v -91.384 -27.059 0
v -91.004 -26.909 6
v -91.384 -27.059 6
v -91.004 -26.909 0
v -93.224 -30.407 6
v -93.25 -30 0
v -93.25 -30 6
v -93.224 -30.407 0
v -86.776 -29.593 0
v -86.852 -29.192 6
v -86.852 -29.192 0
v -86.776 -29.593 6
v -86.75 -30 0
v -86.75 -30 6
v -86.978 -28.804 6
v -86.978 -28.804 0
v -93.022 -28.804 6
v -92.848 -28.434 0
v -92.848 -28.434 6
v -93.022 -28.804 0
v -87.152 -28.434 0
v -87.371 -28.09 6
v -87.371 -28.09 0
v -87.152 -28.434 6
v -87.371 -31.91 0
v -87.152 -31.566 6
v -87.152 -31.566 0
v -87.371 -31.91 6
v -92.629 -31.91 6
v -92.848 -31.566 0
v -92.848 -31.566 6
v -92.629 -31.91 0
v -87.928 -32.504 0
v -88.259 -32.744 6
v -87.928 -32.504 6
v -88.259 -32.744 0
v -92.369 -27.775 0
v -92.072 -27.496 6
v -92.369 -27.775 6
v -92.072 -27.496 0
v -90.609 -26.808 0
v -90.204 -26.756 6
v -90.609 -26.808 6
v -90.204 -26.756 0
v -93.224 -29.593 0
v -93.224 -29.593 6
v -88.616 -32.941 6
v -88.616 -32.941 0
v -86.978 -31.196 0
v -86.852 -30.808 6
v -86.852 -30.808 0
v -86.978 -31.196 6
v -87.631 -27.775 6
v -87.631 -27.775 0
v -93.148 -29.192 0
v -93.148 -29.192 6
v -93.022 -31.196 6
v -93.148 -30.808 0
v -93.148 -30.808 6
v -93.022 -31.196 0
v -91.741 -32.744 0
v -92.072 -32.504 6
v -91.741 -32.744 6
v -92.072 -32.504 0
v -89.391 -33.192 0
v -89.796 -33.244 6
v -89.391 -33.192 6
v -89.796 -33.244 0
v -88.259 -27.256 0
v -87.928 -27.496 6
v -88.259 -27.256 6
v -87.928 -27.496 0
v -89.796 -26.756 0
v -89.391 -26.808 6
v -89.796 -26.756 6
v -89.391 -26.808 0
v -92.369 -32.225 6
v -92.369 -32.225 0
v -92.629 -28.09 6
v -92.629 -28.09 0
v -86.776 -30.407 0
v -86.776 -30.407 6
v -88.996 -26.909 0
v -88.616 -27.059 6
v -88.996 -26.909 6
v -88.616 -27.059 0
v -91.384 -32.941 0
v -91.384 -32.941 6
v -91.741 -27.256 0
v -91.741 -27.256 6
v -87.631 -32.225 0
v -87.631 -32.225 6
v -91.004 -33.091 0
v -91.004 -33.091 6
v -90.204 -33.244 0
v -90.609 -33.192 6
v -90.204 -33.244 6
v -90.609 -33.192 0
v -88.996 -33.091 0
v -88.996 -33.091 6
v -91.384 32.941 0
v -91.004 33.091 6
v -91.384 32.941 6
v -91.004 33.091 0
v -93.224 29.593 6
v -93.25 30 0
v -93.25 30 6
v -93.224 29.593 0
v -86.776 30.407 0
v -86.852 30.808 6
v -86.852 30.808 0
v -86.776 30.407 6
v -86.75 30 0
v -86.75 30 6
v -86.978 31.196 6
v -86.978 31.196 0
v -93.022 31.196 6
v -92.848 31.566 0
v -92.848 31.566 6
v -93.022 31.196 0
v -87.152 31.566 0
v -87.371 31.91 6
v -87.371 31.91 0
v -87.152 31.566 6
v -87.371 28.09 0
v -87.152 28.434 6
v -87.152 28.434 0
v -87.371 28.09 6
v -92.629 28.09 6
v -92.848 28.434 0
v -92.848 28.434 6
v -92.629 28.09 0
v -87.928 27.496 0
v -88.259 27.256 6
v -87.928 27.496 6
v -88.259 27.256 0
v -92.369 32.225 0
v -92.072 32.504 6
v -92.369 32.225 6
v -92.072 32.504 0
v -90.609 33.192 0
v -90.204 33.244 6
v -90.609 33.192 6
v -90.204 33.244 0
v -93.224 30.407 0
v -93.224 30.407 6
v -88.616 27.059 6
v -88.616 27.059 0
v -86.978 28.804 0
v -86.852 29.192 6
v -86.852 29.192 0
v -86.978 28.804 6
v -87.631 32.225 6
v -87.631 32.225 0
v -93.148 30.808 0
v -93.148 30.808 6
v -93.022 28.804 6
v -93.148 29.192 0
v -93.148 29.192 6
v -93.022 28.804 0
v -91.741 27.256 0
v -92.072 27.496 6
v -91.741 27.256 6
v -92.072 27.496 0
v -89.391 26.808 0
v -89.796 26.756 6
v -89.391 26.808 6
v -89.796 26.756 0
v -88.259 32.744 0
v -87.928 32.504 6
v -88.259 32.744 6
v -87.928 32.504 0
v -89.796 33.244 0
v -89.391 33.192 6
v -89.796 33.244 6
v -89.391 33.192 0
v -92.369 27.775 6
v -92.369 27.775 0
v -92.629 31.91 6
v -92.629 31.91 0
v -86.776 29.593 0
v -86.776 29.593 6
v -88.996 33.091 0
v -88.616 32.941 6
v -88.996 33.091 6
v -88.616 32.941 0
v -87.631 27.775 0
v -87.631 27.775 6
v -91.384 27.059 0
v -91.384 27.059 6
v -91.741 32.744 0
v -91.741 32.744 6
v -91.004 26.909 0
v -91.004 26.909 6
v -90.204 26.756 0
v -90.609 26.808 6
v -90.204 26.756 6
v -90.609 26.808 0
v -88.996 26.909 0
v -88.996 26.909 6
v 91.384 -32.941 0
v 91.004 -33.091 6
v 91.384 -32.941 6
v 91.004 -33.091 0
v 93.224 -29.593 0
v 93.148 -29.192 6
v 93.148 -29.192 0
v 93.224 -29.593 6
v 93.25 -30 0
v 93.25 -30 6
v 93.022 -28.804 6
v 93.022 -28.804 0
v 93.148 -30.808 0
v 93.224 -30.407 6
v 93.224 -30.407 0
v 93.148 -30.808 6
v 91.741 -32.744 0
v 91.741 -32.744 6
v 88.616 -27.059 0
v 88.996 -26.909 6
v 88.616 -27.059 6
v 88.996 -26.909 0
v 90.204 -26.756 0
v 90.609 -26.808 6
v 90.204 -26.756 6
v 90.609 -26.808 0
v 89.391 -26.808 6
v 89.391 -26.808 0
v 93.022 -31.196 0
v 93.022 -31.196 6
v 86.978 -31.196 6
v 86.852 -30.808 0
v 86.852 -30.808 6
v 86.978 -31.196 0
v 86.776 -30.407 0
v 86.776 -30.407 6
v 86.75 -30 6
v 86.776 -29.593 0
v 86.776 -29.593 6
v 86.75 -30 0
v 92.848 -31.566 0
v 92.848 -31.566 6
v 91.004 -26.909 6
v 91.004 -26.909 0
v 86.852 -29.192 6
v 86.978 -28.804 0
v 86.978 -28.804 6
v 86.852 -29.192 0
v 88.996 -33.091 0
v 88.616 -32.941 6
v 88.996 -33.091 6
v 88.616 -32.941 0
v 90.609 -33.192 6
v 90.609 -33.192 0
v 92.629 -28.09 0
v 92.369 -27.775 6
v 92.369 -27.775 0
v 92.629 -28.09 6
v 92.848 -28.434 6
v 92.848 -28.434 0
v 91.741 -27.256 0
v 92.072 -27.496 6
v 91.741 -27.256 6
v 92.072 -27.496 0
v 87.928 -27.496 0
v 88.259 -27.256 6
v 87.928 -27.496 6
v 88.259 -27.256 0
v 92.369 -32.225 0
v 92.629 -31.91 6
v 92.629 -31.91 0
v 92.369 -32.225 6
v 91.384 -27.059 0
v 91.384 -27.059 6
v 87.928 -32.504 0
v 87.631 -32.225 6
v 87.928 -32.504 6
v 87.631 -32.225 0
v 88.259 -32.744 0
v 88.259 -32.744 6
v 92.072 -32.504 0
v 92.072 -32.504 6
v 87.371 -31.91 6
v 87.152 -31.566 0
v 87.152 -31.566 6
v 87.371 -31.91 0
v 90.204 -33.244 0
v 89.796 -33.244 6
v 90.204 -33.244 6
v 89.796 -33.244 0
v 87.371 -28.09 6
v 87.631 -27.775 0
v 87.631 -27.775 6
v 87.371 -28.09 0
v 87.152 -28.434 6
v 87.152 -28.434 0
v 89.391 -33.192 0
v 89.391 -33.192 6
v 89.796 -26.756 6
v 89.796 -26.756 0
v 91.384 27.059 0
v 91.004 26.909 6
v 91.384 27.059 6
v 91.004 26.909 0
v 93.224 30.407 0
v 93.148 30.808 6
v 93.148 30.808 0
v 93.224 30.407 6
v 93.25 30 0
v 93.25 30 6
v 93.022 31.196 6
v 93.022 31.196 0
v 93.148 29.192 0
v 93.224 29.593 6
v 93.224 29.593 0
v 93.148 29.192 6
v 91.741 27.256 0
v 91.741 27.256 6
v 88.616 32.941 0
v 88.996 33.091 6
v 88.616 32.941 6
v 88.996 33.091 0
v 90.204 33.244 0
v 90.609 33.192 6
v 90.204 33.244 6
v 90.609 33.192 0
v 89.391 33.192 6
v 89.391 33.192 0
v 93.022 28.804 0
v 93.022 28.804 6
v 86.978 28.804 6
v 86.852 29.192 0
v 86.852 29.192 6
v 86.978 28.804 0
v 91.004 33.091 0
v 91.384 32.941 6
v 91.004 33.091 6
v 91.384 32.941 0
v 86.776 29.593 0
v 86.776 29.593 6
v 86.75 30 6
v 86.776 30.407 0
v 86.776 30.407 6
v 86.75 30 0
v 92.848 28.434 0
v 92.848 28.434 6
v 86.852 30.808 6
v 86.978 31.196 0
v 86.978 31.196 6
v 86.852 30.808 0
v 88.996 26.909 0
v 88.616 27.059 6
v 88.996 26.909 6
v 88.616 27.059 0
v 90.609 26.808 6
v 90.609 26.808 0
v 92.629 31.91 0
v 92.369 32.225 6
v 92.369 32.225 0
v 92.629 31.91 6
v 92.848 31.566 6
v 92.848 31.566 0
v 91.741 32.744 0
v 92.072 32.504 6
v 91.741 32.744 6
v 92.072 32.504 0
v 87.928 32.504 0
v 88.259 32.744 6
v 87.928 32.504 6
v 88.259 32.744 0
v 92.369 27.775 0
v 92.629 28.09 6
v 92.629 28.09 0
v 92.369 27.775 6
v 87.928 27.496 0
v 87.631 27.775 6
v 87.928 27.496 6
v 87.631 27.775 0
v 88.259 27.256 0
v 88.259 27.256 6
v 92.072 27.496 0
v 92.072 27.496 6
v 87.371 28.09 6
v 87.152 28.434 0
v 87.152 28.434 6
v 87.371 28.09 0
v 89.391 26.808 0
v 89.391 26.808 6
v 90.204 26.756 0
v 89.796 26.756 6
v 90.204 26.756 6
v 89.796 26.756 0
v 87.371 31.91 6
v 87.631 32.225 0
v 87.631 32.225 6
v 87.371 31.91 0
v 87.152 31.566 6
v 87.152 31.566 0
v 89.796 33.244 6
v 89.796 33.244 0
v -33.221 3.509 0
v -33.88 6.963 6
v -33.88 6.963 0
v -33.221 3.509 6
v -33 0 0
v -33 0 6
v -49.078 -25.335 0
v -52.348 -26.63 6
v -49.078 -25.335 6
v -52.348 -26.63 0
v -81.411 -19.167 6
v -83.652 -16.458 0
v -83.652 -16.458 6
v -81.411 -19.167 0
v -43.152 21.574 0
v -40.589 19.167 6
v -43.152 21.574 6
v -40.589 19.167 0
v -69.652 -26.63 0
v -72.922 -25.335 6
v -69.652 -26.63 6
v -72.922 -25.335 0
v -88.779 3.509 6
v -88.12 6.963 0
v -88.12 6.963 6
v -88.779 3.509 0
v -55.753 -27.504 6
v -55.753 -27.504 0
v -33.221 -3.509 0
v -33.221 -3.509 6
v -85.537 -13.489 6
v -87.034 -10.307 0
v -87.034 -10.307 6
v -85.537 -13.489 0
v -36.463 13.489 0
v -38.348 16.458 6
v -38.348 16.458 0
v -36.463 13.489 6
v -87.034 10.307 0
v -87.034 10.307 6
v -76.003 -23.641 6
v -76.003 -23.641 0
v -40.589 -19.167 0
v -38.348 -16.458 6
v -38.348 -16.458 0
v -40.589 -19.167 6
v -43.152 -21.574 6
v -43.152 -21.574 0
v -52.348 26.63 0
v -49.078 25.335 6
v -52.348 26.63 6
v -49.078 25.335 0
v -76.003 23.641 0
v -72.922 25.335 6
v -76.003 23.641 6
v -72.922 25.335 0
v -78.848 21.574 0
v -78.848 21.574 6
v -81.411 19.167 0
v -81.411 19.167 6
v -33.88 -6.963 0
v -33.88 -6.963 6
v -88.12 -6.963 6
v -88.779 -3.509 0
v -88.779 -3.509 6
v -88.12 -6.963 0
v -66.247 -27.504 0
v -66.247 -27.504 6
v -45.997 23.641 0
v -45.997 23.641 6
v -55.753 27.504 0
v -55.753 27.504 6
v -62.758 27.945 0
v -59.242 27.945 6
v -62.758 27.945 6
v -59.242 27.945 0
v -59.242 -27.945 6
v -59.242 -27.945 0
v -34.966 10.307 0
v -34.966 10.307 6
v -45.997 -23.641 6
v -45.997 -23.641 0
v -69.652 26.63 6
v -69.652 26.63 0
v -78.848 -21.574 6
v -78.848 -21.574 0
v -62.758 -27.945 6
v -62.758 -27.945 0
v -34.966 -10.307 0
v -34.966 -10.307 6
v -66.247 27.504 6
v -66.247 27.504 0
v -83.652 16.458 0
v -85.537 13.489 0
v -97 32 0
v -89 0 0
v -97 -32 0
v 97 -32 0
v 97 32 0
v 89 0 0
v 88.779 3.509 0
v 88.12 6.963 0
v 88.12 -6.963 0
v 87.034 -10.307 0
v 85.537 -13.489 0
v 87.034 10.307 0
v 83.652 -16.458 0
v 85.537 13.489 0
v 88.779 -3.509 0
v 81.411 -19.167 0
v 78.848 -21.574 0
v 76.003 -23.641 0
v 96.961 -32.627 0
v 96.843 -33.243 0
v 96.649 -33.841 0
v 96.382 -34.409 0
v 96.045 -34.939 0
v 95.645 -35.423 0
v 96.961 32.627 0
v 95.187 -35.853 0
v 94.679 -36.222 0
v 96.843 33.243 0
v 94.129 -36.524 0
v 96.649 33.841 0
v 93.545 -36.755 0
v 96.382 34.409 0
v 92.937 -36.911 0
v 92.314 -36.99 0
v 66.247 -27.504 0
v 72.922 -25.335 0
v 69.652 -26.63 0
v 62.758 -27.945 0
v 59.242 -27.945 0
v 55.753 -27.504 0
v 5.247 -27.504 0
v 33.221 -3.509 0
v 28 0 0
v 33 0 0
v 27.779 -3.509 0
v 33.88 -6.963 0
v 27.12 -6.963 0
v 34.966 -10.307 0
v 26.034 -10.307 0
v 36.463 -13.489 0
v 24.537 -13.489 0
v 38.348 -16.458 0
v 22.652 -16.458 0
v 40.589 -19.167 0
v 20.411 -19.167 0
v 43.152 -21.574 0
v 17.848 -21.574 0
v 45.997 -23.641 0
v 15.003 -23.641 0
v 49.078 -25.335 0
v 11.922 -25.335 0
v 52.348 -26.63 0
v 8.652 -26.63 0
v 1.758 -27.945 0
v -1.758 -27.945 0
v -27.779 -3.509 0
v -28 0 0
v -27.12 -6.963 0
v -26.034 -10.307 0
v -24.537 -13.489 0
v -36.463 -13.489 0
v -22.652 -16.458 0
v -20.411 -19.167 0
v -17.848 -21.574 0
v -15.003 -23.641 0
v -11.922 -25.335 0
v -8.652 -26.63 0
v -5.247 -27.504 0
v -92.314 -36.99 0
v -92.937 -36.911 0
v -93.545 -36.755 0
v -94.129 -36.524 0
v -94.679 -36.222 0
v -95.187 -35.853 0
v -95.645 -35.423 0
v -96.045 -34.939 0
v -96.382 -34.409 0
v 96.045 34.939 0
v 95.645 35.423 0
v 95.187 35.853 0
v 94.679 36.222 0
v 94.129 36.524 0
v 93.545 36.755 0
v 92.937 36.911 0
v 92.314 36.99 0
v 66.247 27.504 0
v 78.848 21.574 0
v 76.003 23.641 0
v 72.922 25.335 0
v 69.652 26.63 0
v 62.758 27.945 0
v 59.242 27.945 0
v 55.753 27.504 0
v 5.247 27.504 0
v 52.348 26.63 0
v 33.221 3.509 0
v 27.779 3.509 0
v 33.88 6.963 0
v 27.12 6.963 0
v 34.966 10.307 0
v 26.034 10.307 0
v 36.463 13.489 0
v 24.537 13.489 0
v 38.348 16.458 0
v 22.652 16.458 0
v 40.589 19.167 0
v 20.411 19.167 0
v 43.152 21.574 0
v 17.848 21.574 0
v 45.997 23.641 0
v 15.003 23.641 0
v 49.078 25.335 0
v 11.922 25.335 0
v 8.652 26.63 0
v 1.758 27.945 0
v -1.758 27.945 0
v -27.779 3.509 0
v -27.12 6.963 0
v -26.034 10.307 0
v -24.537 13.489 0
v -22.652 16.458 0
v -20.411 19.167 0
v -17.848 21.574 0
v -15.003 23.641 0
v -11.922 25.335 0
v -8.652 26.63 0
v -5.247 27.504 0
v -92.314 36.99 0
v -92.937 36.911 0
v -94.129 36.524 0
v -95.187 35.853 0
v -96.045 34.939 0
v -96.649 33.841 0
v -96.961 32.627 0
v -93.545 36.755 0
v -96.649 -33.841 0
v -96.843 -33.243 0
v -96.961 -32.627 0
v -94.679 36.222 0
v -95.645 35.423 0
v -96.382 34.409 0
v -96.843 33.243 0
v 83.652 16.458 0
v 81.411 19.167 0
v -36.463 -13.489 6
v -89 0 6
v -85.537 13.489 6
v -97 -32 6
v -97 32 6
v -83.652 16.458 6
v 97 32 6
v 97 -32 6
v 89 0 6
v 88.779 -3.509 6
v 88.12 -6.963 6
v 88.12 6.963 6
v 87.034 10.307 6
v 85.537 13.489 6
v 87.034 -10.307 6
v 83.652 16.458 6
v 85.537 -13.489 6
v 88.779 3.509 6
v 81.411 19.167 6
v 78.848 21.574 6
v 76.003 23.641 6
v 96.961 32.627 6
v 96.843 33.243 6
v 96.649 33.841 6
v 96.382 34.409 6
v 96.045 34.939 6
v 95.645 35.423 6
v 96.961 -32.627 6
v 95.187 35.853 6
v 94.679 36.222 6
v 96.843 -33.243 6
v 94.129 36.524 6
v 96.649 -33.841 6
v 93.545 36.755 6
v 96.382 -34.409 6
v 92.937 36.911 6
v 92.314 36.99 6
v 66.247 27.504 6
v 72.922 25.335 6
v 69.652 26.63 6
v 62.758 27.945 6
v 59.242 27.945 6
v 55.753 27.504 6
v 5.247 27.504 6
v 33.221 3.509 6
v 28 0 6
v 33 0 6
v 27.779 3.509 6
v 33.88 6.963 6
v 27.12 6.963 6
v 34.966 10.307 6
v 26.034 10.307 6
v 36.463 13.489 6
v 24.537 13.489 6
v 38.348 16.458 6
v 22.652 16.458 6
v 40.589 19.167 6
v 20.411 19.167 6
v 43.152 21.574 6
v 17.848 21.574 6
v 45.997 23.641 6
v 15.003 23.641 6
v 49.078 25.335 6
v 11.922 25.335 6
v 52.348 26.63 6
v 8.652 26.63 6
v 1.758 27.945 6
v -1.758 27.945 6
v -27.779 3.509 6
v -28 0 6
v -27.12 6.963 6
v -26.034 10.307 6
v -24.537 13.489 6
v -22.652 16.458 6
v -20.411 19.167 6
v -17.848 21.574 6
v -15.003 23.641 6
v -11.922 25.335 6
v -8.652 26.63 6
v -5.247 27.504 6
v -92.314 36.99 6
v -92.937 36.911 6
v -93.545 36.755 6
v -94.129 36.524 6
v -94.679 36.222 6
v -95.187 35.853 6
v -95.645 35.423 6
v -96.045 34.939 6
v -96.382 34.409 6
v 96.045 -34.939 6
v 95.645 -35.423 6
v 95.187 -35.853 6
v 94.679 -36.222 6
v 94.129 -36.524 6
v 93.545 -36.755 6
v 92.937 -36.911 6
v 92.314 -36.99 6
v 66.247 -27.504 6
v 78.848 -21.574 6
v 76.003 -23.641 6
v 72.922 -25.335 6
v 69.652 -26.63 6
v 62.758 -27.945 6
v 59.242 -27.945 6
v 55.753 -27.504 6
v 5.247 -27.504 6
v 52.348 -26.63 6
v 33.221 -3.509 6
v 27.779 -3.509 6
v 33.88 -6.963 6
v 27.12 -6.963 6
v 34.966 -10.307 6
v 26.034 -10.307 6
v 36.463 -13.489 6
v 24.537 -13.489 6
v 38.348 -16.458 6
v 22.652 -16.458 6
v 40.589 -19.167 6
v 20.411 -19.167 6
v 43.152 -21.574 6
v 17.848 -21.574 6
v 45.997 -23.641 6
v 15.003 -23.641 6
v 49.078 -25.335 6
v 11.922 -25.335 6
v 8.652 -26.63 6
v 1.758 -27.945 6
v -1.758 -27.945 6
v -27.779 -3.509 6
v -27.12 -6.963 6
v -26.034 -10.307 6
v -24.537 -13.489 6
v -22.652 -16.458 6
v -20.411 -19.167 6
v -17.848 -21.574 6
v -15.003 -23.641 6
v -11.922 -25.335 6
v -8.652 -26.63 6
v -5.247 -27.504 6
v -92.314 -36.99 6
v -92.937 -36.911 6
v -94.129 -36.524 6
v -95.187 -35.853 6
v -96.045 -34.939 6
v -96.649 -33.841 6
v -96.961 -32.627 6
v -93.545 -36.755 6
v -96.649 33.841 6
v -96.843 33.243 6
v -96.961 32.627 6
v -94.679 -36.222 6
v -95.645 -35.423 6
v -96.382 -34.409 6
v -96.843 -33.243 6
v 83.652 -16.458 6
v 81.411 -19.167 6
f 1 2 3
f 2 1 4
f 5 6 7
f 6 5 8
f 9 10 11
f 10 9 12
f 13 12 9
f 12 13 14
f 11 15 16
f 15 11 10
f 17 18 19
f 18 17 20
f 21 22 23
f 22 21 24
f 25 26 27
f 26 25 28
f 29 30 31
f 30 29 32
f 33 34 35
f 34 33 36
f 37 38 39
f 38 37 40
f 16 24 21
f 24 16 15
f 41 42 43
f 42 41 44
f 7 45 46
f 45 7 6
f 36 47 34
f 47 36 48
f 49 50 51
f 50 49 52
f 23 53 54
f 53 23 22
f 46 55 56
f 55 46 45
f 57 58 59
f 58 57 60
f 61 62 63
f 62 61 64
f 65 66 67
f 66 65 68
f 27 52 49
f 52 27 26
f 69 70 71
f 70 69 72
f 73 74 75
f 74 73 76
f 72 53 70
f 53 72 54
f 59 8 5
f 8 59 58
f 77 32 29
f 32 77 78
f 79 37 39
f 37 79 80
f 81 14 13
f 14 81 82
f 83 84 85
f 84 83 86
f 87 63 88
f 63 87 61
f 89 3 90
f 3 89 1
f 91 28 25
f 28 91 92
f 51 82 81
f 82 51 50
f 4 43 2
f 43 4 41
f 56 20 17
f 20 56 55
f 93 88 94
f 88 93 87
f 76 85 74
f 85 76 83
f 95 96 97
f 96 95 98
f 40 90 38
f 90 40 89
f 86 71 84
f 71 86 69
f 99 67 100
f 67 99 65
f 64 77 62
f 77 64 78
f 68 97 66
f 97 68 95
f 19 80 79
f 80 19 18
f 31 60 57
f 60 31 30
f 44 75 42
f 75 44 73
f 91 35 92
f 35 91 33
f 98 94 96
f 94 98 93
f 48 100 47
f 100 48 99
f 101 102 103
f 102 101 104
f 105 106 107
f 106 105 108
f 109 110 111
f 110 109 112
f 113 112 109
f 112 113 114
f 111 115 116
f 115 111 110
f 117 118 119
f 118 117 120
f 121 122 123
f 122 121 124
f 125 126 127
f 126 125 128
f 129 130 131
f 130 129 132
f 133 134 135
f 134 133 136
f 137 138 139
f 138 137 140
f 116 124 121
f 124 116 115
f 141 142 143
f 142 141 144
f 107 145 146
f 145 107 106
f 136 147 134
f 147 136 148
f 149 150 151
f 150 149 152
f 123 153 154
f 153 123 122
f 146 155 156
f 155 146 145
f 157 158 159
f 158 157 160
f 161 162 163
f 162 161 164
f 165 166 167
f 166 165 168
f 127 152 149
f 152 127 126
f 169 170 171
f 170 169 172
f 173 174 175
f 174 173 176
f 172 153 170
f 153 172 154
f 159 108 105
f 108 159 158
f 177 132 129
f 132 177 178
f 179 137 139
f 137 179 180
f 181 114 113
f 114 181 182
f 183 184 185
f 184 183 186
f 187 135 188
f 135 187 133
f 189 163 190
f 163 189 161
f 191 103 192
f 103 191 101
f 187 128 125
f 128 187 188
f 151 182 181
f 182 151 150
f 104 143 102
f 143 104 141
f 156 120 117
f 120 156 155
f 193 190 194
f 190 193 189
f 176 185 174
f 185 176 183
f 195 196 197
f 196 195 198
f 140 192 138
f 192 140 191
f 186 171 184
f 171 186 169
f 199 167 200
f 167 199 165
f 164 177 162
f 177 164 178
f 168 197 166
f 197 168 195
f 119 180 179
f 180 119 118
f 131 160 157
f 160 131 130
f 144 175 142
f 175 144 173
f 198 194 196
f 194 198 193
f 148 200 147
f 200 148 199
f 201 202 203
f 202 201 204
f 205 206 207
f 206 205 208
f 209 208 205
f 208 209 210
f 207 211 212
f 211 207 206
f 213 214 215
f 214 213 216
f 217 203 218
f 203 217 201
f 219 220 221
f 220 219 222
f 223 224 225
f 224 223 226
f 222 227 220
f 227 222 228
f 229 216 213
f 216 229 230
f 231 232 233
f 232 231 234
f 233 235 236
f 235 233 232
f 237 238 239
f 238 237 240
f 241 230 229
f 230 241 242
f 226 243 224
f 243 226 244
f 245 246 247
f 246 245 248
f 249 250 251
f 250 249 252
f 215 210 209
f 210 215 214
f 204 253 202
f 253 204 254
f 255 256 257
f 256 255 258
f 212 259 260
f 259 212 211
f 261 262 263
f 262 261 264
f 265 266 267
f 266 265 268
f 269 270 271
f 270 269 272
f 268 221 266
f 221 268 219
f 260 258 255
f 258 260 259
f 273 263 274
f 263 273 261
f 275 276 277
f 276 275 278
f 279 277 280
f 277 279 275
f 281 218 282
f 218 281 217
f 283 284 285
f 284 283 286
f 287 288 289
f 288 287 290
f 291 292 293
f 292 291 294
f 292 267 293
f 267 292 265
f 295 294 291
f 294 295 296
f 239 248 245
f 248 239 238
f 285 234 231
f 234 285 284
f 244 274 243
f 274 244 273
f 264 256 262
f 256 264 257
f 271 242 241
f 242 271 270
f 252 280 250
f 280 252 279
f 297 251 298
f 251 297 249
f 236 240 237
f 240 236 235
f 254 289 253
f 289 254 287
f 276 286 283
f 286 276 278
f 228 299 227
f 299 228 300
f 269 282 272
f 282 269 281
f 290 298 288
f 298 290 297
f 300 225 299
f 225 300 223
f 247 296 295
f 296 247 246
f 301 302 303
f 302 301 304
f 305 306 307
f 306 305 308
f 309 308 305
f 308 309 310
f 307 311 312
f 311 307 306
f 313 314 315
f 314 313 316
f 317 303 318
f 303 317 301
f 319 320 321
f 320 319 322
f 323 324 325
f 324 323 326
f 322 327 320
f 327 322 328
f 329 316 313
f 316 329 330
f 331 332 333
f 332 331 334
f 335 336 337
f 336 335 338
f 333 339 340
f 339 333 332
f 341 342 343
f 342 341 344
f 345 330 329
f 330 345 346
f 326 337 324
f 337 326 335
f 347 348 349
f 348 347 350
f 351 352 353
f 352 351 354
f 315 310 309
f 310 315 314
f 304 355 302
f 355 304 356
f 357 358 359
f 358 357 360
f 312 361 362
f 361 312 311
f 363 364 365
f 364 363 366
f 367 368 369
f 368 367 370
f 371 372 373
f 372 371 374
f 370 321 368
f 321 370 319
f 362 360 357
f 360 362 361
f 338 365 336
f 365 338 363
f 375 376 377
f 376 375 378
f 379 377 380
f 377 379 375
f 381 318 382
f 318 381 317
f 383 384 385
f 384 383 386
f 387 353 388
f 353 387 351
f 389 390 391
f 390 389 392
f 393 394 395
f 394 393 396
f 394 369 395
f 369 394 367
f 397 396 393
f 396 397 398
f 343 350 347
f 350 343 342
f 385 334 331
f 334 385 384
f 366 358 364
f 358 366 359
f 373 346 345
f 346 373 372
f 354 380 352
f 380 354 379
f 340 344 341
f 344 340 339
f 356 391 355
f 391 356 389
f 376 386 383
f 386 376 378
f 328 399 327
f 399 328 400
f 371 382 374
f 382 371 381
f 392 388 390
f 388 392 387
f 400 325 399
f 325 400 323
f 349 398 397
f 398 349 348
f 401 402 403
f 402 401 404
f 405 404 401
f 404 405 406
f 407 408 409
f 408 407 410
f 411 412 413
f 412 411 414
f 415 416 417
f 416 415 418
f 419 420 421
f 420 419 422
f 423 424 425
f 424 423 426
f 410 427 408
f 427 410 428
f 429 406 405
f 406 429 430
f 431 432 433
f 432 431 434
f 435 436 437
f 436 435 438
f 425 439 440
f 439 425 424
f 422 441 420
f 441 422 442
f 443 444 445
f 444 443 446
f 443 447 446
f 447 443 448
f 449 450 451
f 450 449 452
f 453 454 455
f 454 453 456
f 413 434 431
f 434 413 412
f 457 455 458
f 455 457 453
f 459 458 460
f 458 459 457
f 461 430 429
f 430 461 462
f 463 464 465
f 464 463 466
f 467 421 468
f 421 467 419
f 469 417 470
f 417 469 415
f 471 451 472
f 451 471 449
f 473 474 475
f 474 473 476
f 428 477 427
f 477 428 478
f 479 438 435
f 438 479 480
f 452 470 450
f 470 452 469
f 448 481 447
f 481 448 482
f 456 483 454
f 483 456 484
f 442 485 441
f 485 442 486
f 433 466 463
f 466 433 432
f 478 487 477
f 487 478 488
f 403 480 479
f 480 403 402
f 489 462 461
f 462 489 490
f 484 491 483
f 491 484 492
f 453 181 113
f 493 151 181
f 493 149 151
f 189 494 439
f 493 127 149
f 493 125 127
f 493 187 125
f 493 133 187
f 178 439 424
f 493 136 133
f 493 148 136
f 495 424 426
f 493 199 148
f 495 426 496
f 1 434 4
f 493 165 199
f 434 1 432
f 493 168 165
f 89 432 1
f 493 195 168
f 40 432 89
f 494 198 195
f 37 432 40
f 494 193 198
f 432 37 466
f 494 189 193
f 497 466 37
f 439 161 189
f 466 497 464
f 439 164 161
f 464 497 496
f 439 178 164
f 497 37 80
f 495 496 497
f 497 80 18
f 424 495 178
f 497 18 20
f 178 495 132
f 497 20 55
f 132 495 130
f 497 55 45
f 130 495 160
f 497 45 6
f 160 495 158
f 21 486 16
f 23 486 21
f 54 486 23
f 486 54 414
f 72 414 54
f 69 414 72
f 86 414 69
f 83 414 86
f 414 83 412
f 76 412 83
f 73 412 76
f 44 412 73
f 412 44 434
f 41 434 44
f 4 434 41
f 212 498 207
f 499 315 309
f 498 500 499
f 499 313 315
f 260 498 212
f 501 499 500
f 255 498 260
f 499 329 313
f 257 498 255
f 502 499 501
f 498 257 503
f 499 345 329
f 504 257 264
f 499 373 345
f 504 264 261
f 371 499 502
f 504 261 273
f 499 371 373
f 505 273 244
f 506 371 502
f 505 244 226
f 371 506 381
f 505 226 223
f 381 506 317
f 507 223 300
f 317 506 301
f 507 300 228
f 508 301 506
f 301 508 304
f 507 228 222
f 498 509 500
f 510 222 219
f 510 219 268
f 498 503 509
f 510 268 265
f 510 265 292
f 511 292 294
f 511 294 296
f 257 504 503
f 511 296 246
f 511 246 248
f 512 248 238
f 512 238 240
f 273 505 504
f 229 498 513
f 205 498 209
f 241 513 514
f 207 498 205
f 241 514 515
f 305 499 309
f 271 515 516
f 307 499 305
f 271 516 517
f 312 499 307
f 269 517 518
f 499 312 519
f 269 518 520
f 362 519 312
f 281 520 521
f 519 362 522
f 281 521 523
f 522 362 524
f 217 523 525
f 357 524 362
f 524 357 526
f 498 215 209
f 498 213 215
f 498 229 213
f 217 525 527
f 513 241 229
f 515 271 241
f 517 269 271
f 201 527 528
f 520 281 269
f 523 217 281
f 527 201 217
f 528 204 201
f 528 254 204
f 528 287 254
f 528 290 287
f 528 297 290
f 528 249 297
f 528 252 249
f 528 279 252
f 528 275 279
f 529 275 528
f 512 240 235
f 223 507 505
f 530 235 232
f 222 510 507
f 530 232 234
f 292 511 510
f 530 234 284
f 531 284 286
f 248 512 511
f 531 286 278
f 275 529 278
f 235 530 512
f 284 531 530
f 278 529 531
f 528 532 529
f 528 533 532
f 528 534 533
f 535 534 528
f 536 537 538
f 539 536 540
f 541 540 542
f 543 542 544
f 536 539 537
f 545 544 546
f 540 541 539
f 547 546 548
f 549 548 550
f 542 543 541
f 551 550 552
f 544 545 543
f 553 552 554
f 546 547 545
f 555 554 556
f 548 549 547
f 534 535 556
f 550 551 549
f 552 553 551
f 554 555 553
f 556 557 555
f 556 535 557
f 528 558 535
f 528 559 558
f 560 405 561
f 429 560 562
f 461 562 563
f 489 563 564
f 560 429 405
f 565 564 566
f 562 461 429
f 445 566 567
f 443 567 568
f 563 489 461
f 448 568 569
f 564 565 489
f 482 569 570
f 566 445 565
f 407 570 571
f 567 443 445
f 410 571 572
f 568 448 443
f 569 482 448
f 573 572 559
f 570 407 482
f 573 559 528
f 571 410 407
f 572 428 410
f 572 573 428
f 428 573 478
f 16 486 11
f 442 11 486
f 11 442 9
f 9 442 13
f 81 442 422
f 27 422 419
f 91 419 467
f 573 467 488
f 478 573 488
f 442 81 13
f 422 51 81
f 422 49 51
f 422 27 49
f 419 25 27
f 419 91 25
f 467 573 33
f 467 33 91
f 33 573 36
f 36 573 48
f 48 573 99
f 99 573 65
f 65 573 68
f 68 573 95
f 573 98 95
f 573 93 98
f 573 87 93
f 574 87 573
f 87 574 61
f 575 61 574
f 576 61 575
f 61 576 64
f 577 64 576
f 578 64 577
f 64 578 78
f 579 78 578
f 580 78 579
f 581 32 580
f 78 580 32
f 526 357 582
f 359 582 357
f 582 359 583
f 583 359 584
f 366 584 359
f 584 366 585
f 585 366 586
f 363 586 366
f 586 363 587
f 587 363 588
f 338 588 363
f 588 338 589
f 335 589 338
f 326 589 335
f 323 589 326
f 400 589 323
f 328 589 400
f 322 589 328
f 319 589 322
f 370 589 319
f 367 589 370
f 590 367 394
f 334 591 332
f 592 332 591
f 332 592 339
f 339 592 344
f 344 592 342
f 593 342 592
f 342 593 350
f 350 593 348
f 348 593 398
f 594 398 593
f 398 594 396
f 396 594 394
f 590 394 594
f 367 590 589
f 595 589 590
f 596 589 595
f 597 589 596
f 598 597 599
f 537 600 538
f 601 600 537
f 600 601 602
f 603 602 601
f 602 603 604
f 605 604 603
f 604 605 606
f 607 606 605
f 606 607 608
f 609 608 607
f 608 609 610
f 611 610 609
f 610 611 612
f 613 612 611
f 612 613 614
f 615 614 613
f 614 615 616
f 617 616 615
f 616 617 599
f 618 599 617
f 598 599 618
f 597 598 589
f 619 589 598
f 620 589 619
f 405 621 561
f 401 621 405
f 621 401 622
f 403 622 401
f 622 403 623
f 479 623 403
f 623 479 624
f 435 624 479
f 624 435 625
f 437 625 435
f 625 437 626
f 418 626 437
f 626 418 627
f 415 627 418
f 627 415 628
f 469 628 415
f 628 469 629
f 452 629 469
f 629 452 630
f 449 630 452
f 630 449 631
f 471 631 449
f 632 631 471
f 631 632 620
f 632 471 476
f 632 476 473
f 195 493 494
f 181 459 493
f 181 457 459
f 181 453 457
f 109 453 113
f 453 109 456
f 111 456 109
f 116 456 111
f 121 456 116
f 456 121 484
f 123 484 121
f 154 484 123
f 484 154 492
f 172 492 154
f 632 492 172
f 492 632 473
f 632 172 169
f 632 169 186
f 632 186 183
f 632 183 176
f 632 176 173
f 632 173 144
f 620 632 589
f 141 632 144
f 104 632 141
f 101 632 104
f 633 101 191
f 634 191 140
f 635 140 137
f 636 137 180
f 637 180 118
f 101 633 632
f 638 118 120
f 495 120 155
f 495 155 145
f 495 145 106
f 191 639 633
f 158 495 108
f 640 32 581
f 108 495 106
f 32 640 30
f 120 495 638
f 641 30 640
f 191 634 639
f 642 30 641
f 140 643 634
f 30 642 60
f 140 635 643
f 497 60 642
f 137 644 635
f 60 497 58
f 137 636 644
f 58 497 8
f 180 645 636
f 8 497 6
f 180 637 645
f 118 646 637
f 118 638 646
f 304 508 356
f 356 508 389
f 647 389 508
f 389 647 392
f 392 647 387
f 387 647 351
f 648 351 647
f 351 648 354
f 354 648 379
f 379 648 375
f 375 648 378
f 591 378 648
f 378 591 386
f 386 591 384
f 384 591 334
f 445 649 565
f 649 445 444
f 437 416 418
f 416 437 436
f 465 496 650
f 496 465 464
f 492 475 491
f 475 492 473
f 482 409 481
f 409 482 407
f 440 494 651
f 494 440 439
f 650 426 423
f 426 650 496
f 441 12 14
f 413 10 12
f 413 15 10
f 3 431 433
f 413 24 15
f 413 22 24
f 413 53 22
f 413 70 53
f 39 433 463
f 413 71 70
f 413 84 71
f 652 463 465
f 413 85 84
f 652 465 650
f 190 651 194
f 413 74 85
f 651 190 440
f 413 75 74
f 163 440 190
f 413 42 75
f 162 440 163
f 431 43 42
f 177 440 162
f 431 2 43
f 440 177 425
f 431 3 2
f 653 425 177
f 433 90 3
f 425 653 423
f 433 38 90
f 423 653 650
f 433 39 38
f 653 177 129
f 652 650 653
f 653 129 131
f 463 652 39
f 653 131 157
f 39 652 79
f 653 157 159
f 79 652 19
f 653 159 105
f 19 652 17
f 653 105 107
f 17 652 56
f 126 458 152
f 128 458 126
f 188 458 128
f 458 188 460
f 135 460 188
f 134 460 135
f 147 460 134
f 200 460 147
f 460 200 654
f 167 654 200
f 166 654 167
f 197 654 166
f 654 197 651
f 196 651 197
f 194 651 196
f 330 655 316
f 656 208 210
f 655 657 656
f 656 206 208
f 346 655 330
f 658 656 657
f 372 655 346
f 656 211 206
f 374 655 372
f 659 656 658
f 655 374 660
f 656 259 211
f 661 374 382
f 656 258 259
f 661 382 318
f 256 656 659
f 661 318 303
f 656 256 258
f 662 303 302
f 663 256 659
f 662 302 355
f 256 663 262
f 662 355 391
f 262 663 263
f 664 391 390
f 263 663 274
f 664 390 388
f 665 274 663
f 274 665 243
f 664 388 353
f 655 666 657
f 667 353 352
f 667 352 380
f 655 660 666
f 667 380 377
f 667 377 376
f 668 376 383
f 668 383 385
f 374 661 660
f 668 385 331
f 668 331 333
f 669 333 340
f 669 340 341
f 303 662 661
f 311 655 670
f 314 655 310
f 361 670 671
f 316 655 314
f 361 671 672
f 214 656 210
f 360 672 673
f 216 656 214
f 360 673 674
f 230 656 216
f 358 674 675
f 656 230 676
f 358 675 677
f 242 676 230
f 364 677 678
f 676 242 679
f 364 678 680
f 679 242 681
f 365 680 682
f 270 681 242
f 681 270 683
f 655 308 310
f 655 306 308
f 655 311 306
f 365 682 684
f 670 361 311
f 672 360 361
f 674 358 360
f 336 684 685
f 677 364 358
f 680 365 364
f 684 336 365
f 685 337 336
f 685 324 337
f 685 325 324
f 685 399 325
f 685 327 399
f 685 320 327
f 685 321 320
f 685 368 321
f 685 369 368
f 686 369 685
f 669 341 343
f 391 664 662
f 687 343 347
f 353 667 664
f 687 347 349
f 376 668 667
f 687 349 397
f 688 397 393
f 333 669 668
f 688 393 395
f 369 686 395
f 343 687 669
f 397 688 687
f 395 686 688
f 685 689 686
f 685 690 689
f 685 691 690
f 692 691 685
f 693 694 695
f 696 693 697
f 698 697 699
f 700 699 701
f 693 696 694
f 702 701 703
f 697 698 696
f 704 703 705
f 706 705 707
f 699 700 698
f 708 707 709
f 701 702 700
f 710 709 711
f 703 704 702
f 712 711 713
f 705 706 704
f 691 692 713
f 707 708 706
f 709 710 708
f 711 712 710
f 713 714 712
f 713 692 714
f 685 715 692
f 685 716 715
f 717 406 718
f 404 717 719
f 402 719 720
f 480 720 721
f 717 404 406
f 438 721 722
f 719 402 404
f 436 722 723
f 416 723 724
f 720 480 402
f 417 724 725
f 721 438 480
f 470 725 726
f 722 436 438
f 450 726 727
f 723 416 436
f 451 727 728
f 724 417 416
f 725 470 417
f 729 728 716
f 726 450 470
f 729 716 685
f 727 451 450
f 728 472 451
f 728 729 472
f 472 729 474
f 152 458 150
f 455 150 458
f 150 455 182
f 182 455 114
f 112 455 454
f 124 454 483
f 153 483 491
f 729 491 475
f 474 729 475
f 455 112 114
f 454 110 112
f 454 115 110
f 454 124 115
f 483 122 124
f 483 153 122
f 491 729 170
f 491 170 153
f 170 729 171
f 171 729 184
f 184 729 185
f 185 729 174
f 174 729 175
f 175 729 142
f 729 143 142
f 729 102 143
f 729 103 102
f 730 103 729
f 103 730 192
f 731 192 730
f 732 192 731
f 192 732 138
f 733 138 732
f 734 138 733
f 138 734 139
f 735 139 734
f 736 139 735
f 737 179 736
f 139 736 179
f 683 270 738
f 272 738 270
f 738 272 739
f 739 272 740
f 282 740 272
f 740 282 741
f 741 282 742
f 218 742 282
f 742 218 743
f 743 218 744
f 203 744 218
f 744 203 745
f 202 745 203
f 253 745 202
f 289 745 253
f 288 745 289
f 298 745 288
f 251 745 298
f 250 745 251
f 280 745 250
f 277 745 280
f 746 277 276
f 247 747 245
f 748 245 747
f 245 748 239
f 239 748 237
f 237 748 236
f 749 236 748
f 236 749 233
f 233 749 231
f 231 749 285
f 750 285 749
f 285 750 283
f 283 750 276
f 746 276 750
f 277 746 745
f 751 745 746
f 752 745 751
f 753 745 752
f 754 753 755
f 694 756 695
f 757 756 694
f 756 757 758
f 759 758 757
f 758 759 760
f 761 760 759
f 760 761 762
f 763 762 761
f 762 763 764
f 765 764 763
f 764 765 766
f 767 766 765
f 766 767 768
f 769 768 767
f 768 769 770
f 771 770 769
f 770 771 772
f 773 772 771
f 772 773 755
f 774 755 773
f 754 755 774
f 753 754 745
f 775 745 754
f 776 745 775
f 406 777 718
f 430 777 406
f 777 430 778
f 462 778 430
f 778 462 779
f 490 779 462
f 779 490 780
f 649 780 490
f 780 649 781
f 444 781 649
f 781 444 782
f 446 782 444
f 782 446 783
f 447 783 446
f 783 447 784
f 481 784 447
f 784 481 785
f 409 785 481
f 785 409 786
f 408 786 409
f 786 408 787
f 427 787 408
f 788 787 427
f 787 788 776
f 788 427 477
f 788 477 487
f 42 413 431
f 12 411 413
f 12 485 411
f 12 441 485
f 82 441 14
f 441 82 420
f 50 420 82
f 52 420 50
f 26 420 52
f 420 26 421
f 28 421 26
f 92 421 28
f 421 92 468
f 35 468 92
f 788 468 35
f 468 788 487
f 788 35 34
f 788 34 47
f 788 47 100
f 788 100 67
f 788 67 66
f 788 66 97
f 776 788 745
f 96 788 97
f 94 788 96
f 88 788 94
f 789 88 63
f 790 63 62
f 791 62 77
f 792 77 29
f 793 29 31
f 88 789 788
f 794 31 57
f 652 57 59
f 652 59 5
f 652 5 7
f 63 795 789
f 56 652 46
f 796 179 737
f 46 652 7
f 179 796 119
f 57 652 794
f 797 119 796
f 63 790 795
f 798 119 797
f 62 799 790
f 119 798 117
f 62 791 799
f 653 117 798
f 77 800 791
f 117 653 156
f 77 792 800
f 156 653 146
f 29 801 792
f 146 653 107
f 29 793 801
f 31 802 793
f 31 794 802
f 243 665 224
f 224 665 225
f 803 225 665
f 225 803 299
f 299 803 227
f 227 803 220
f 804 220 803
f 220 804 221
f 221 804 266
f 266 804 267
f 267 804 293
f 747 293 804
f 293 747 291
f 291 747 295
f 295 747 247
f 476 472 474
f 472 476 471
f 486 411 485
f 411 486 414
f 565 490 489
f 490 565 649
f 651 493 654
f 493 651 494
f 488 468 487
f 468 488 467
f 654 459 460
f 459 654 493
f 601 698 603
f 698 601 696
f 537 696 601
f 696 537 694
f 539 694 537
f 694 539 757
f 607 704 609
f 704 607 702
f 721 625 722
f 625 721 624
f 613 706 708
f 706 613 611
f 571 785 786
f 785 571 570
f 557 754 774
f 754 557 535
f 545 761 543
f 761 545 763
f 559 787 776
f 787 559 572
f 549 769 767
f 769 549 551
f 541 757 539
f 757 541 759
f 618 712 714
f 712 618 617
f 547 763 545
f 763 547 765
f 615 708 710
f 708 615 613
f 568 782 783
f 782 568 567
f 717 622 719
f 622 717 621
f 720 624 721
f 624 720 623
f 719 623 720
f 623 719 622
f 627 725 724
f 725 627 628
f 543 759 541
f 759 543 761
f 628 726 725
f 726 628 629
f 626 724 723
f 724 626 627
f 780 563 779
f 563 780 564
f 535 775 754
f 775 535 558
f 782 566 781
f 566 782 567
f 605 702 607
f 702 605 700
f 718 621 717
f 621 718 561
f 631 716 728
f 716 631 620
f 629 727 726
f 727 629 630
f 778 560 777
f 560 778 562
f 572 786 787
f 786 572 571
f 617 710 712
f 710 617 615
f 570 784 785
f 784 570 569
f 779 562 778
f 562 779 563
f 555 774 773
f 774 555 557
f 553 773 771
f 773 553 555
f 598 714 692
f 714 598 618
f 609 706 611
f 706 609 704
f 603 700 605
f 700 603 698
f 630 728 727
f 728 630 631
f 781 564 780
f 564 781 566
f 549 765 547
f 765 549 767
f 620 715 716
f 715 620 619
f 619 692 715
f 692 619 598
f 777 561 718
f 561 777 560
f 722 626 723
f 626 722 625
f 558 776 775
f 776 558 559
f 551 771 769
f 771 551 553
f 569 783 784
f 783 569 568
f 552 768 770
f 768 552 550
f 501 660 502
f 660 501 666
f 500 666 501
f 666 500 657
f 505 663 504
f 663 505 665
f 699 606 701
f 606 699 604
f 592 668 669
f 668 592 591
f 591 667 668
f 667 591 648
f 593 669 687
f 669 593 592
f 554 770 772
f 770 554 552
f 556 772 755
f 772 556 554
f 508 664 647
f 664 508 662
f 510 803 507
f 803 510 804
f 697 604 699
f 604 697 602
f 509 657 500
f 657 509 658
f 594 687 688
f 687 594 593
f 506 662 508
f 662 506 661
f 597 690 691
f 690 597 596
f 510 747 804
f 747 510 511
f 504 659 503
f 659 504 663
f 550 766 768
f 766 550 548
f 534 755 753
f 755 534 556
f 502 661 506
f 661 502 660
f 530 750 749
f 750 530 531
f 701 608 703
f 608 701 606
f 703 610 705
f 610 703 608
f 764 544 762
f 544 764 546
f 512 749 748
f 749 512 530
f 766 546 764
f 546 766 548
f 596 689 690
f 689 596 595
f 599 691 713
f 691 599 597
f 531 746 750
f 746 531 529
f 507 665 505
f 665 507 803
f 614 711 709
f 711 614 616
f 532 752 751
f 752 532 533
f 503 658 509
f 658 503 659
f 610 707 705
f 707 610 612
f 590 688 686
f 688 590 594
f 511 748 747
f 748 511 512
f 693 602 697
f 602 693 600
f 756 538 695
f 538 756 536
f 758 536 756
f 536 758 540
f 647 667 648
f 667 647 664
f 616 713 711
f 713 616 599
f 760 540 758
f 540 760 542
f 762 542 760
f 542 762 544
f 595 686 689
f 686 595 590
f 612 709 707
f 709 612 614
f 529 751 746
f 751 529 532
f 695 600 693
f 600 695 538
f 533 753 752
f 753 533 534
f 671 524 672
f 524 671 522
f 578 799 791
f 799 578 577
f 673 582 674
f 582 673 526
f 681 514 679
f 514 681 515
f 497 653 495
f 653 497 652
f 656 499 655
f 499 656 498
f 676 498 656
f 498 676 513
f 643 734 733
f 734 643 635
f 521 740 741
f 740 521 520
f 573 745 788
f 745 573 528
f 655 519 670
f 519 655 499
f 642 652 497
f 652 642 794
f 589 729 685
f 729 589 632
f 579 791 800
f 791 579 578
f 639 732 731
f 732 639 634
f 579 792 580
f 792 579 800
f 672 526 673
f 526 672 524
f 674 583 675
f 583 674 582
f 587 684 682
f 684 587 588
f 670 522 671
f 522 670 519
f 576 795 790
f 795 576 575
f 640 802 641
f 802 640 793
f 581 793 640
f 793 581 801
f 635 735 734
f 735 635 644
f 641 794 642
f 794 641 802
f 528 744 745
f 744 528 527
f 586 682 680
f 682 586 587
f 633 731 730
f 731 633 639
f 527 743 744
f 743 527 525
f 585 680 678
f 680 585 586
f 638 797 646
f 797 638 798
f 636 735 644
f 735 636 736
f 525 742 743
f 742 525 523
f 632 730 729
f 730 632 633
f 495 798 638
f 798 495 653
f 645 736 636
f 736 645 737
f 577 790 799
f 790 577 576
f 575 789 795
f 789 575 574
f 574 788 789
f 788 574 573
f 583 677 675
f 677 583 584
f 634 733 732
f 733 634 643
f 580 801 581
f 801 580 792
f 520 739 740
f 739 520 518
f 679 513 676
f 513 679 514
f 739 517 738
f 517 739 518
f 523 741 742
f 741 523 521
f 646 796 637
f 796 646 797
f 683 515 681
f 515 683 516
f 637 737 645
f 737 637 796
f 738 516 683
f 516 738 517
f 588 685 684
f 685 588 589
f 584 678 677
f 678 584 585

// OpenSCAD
$fn = 50;


difference() {
	union() {
		hull() {
			translate(v = [-92.0000000000, 32.0000000000, 0]) {
				cylinder(h = 6, r = 5);
			}
			translate(v = [92.0000000000, 32.0000000000, 0]) {
				cylinder(h = 6, r = 5);
			}
			translate(v = [-92.0000000000, -32.0000000000, 0]) {
				cylinder(h = 6, r = 5);
			}
			translate(v = [92.0000000000, -32.0000000000, 0]) {
				cylinder(h = 6, r = 5);
			}
		}
	}
	union() {
		#translate(v = [-90.0000000000, -30.0000000000, -100.0000000000]) {
			cylinder(h = 200, r = 3.2500000000);
		}
		#translate(v = [-90.0000000000, 30.0000000000, -100.0000000000]) {
			cylinder(h = 200, r = 3.2500000000);
		}
		#translate(v = [90.0000000000, -30.0000000000, -100.0000000000]) {
			cylinder(h = 200, r = 3.2500000000);
		}
		#translate(v = [90.0000000000, 30.0000000000, -100.0000000000]) {
			cylinder(h = 200, r = 3.2500000000);
		}
		#translate(v = [-61.0000000000, 0, 0]) {
			cylinder(h = 6, r = 28.0000000000);
		}
		#cylinder(h = 6, r = 28.0000000000);
		#translate(v = [61.0000000000, 0, 0]) {
			cylinder(h = 6, r = 28.0000000000);
		}
	}
}
